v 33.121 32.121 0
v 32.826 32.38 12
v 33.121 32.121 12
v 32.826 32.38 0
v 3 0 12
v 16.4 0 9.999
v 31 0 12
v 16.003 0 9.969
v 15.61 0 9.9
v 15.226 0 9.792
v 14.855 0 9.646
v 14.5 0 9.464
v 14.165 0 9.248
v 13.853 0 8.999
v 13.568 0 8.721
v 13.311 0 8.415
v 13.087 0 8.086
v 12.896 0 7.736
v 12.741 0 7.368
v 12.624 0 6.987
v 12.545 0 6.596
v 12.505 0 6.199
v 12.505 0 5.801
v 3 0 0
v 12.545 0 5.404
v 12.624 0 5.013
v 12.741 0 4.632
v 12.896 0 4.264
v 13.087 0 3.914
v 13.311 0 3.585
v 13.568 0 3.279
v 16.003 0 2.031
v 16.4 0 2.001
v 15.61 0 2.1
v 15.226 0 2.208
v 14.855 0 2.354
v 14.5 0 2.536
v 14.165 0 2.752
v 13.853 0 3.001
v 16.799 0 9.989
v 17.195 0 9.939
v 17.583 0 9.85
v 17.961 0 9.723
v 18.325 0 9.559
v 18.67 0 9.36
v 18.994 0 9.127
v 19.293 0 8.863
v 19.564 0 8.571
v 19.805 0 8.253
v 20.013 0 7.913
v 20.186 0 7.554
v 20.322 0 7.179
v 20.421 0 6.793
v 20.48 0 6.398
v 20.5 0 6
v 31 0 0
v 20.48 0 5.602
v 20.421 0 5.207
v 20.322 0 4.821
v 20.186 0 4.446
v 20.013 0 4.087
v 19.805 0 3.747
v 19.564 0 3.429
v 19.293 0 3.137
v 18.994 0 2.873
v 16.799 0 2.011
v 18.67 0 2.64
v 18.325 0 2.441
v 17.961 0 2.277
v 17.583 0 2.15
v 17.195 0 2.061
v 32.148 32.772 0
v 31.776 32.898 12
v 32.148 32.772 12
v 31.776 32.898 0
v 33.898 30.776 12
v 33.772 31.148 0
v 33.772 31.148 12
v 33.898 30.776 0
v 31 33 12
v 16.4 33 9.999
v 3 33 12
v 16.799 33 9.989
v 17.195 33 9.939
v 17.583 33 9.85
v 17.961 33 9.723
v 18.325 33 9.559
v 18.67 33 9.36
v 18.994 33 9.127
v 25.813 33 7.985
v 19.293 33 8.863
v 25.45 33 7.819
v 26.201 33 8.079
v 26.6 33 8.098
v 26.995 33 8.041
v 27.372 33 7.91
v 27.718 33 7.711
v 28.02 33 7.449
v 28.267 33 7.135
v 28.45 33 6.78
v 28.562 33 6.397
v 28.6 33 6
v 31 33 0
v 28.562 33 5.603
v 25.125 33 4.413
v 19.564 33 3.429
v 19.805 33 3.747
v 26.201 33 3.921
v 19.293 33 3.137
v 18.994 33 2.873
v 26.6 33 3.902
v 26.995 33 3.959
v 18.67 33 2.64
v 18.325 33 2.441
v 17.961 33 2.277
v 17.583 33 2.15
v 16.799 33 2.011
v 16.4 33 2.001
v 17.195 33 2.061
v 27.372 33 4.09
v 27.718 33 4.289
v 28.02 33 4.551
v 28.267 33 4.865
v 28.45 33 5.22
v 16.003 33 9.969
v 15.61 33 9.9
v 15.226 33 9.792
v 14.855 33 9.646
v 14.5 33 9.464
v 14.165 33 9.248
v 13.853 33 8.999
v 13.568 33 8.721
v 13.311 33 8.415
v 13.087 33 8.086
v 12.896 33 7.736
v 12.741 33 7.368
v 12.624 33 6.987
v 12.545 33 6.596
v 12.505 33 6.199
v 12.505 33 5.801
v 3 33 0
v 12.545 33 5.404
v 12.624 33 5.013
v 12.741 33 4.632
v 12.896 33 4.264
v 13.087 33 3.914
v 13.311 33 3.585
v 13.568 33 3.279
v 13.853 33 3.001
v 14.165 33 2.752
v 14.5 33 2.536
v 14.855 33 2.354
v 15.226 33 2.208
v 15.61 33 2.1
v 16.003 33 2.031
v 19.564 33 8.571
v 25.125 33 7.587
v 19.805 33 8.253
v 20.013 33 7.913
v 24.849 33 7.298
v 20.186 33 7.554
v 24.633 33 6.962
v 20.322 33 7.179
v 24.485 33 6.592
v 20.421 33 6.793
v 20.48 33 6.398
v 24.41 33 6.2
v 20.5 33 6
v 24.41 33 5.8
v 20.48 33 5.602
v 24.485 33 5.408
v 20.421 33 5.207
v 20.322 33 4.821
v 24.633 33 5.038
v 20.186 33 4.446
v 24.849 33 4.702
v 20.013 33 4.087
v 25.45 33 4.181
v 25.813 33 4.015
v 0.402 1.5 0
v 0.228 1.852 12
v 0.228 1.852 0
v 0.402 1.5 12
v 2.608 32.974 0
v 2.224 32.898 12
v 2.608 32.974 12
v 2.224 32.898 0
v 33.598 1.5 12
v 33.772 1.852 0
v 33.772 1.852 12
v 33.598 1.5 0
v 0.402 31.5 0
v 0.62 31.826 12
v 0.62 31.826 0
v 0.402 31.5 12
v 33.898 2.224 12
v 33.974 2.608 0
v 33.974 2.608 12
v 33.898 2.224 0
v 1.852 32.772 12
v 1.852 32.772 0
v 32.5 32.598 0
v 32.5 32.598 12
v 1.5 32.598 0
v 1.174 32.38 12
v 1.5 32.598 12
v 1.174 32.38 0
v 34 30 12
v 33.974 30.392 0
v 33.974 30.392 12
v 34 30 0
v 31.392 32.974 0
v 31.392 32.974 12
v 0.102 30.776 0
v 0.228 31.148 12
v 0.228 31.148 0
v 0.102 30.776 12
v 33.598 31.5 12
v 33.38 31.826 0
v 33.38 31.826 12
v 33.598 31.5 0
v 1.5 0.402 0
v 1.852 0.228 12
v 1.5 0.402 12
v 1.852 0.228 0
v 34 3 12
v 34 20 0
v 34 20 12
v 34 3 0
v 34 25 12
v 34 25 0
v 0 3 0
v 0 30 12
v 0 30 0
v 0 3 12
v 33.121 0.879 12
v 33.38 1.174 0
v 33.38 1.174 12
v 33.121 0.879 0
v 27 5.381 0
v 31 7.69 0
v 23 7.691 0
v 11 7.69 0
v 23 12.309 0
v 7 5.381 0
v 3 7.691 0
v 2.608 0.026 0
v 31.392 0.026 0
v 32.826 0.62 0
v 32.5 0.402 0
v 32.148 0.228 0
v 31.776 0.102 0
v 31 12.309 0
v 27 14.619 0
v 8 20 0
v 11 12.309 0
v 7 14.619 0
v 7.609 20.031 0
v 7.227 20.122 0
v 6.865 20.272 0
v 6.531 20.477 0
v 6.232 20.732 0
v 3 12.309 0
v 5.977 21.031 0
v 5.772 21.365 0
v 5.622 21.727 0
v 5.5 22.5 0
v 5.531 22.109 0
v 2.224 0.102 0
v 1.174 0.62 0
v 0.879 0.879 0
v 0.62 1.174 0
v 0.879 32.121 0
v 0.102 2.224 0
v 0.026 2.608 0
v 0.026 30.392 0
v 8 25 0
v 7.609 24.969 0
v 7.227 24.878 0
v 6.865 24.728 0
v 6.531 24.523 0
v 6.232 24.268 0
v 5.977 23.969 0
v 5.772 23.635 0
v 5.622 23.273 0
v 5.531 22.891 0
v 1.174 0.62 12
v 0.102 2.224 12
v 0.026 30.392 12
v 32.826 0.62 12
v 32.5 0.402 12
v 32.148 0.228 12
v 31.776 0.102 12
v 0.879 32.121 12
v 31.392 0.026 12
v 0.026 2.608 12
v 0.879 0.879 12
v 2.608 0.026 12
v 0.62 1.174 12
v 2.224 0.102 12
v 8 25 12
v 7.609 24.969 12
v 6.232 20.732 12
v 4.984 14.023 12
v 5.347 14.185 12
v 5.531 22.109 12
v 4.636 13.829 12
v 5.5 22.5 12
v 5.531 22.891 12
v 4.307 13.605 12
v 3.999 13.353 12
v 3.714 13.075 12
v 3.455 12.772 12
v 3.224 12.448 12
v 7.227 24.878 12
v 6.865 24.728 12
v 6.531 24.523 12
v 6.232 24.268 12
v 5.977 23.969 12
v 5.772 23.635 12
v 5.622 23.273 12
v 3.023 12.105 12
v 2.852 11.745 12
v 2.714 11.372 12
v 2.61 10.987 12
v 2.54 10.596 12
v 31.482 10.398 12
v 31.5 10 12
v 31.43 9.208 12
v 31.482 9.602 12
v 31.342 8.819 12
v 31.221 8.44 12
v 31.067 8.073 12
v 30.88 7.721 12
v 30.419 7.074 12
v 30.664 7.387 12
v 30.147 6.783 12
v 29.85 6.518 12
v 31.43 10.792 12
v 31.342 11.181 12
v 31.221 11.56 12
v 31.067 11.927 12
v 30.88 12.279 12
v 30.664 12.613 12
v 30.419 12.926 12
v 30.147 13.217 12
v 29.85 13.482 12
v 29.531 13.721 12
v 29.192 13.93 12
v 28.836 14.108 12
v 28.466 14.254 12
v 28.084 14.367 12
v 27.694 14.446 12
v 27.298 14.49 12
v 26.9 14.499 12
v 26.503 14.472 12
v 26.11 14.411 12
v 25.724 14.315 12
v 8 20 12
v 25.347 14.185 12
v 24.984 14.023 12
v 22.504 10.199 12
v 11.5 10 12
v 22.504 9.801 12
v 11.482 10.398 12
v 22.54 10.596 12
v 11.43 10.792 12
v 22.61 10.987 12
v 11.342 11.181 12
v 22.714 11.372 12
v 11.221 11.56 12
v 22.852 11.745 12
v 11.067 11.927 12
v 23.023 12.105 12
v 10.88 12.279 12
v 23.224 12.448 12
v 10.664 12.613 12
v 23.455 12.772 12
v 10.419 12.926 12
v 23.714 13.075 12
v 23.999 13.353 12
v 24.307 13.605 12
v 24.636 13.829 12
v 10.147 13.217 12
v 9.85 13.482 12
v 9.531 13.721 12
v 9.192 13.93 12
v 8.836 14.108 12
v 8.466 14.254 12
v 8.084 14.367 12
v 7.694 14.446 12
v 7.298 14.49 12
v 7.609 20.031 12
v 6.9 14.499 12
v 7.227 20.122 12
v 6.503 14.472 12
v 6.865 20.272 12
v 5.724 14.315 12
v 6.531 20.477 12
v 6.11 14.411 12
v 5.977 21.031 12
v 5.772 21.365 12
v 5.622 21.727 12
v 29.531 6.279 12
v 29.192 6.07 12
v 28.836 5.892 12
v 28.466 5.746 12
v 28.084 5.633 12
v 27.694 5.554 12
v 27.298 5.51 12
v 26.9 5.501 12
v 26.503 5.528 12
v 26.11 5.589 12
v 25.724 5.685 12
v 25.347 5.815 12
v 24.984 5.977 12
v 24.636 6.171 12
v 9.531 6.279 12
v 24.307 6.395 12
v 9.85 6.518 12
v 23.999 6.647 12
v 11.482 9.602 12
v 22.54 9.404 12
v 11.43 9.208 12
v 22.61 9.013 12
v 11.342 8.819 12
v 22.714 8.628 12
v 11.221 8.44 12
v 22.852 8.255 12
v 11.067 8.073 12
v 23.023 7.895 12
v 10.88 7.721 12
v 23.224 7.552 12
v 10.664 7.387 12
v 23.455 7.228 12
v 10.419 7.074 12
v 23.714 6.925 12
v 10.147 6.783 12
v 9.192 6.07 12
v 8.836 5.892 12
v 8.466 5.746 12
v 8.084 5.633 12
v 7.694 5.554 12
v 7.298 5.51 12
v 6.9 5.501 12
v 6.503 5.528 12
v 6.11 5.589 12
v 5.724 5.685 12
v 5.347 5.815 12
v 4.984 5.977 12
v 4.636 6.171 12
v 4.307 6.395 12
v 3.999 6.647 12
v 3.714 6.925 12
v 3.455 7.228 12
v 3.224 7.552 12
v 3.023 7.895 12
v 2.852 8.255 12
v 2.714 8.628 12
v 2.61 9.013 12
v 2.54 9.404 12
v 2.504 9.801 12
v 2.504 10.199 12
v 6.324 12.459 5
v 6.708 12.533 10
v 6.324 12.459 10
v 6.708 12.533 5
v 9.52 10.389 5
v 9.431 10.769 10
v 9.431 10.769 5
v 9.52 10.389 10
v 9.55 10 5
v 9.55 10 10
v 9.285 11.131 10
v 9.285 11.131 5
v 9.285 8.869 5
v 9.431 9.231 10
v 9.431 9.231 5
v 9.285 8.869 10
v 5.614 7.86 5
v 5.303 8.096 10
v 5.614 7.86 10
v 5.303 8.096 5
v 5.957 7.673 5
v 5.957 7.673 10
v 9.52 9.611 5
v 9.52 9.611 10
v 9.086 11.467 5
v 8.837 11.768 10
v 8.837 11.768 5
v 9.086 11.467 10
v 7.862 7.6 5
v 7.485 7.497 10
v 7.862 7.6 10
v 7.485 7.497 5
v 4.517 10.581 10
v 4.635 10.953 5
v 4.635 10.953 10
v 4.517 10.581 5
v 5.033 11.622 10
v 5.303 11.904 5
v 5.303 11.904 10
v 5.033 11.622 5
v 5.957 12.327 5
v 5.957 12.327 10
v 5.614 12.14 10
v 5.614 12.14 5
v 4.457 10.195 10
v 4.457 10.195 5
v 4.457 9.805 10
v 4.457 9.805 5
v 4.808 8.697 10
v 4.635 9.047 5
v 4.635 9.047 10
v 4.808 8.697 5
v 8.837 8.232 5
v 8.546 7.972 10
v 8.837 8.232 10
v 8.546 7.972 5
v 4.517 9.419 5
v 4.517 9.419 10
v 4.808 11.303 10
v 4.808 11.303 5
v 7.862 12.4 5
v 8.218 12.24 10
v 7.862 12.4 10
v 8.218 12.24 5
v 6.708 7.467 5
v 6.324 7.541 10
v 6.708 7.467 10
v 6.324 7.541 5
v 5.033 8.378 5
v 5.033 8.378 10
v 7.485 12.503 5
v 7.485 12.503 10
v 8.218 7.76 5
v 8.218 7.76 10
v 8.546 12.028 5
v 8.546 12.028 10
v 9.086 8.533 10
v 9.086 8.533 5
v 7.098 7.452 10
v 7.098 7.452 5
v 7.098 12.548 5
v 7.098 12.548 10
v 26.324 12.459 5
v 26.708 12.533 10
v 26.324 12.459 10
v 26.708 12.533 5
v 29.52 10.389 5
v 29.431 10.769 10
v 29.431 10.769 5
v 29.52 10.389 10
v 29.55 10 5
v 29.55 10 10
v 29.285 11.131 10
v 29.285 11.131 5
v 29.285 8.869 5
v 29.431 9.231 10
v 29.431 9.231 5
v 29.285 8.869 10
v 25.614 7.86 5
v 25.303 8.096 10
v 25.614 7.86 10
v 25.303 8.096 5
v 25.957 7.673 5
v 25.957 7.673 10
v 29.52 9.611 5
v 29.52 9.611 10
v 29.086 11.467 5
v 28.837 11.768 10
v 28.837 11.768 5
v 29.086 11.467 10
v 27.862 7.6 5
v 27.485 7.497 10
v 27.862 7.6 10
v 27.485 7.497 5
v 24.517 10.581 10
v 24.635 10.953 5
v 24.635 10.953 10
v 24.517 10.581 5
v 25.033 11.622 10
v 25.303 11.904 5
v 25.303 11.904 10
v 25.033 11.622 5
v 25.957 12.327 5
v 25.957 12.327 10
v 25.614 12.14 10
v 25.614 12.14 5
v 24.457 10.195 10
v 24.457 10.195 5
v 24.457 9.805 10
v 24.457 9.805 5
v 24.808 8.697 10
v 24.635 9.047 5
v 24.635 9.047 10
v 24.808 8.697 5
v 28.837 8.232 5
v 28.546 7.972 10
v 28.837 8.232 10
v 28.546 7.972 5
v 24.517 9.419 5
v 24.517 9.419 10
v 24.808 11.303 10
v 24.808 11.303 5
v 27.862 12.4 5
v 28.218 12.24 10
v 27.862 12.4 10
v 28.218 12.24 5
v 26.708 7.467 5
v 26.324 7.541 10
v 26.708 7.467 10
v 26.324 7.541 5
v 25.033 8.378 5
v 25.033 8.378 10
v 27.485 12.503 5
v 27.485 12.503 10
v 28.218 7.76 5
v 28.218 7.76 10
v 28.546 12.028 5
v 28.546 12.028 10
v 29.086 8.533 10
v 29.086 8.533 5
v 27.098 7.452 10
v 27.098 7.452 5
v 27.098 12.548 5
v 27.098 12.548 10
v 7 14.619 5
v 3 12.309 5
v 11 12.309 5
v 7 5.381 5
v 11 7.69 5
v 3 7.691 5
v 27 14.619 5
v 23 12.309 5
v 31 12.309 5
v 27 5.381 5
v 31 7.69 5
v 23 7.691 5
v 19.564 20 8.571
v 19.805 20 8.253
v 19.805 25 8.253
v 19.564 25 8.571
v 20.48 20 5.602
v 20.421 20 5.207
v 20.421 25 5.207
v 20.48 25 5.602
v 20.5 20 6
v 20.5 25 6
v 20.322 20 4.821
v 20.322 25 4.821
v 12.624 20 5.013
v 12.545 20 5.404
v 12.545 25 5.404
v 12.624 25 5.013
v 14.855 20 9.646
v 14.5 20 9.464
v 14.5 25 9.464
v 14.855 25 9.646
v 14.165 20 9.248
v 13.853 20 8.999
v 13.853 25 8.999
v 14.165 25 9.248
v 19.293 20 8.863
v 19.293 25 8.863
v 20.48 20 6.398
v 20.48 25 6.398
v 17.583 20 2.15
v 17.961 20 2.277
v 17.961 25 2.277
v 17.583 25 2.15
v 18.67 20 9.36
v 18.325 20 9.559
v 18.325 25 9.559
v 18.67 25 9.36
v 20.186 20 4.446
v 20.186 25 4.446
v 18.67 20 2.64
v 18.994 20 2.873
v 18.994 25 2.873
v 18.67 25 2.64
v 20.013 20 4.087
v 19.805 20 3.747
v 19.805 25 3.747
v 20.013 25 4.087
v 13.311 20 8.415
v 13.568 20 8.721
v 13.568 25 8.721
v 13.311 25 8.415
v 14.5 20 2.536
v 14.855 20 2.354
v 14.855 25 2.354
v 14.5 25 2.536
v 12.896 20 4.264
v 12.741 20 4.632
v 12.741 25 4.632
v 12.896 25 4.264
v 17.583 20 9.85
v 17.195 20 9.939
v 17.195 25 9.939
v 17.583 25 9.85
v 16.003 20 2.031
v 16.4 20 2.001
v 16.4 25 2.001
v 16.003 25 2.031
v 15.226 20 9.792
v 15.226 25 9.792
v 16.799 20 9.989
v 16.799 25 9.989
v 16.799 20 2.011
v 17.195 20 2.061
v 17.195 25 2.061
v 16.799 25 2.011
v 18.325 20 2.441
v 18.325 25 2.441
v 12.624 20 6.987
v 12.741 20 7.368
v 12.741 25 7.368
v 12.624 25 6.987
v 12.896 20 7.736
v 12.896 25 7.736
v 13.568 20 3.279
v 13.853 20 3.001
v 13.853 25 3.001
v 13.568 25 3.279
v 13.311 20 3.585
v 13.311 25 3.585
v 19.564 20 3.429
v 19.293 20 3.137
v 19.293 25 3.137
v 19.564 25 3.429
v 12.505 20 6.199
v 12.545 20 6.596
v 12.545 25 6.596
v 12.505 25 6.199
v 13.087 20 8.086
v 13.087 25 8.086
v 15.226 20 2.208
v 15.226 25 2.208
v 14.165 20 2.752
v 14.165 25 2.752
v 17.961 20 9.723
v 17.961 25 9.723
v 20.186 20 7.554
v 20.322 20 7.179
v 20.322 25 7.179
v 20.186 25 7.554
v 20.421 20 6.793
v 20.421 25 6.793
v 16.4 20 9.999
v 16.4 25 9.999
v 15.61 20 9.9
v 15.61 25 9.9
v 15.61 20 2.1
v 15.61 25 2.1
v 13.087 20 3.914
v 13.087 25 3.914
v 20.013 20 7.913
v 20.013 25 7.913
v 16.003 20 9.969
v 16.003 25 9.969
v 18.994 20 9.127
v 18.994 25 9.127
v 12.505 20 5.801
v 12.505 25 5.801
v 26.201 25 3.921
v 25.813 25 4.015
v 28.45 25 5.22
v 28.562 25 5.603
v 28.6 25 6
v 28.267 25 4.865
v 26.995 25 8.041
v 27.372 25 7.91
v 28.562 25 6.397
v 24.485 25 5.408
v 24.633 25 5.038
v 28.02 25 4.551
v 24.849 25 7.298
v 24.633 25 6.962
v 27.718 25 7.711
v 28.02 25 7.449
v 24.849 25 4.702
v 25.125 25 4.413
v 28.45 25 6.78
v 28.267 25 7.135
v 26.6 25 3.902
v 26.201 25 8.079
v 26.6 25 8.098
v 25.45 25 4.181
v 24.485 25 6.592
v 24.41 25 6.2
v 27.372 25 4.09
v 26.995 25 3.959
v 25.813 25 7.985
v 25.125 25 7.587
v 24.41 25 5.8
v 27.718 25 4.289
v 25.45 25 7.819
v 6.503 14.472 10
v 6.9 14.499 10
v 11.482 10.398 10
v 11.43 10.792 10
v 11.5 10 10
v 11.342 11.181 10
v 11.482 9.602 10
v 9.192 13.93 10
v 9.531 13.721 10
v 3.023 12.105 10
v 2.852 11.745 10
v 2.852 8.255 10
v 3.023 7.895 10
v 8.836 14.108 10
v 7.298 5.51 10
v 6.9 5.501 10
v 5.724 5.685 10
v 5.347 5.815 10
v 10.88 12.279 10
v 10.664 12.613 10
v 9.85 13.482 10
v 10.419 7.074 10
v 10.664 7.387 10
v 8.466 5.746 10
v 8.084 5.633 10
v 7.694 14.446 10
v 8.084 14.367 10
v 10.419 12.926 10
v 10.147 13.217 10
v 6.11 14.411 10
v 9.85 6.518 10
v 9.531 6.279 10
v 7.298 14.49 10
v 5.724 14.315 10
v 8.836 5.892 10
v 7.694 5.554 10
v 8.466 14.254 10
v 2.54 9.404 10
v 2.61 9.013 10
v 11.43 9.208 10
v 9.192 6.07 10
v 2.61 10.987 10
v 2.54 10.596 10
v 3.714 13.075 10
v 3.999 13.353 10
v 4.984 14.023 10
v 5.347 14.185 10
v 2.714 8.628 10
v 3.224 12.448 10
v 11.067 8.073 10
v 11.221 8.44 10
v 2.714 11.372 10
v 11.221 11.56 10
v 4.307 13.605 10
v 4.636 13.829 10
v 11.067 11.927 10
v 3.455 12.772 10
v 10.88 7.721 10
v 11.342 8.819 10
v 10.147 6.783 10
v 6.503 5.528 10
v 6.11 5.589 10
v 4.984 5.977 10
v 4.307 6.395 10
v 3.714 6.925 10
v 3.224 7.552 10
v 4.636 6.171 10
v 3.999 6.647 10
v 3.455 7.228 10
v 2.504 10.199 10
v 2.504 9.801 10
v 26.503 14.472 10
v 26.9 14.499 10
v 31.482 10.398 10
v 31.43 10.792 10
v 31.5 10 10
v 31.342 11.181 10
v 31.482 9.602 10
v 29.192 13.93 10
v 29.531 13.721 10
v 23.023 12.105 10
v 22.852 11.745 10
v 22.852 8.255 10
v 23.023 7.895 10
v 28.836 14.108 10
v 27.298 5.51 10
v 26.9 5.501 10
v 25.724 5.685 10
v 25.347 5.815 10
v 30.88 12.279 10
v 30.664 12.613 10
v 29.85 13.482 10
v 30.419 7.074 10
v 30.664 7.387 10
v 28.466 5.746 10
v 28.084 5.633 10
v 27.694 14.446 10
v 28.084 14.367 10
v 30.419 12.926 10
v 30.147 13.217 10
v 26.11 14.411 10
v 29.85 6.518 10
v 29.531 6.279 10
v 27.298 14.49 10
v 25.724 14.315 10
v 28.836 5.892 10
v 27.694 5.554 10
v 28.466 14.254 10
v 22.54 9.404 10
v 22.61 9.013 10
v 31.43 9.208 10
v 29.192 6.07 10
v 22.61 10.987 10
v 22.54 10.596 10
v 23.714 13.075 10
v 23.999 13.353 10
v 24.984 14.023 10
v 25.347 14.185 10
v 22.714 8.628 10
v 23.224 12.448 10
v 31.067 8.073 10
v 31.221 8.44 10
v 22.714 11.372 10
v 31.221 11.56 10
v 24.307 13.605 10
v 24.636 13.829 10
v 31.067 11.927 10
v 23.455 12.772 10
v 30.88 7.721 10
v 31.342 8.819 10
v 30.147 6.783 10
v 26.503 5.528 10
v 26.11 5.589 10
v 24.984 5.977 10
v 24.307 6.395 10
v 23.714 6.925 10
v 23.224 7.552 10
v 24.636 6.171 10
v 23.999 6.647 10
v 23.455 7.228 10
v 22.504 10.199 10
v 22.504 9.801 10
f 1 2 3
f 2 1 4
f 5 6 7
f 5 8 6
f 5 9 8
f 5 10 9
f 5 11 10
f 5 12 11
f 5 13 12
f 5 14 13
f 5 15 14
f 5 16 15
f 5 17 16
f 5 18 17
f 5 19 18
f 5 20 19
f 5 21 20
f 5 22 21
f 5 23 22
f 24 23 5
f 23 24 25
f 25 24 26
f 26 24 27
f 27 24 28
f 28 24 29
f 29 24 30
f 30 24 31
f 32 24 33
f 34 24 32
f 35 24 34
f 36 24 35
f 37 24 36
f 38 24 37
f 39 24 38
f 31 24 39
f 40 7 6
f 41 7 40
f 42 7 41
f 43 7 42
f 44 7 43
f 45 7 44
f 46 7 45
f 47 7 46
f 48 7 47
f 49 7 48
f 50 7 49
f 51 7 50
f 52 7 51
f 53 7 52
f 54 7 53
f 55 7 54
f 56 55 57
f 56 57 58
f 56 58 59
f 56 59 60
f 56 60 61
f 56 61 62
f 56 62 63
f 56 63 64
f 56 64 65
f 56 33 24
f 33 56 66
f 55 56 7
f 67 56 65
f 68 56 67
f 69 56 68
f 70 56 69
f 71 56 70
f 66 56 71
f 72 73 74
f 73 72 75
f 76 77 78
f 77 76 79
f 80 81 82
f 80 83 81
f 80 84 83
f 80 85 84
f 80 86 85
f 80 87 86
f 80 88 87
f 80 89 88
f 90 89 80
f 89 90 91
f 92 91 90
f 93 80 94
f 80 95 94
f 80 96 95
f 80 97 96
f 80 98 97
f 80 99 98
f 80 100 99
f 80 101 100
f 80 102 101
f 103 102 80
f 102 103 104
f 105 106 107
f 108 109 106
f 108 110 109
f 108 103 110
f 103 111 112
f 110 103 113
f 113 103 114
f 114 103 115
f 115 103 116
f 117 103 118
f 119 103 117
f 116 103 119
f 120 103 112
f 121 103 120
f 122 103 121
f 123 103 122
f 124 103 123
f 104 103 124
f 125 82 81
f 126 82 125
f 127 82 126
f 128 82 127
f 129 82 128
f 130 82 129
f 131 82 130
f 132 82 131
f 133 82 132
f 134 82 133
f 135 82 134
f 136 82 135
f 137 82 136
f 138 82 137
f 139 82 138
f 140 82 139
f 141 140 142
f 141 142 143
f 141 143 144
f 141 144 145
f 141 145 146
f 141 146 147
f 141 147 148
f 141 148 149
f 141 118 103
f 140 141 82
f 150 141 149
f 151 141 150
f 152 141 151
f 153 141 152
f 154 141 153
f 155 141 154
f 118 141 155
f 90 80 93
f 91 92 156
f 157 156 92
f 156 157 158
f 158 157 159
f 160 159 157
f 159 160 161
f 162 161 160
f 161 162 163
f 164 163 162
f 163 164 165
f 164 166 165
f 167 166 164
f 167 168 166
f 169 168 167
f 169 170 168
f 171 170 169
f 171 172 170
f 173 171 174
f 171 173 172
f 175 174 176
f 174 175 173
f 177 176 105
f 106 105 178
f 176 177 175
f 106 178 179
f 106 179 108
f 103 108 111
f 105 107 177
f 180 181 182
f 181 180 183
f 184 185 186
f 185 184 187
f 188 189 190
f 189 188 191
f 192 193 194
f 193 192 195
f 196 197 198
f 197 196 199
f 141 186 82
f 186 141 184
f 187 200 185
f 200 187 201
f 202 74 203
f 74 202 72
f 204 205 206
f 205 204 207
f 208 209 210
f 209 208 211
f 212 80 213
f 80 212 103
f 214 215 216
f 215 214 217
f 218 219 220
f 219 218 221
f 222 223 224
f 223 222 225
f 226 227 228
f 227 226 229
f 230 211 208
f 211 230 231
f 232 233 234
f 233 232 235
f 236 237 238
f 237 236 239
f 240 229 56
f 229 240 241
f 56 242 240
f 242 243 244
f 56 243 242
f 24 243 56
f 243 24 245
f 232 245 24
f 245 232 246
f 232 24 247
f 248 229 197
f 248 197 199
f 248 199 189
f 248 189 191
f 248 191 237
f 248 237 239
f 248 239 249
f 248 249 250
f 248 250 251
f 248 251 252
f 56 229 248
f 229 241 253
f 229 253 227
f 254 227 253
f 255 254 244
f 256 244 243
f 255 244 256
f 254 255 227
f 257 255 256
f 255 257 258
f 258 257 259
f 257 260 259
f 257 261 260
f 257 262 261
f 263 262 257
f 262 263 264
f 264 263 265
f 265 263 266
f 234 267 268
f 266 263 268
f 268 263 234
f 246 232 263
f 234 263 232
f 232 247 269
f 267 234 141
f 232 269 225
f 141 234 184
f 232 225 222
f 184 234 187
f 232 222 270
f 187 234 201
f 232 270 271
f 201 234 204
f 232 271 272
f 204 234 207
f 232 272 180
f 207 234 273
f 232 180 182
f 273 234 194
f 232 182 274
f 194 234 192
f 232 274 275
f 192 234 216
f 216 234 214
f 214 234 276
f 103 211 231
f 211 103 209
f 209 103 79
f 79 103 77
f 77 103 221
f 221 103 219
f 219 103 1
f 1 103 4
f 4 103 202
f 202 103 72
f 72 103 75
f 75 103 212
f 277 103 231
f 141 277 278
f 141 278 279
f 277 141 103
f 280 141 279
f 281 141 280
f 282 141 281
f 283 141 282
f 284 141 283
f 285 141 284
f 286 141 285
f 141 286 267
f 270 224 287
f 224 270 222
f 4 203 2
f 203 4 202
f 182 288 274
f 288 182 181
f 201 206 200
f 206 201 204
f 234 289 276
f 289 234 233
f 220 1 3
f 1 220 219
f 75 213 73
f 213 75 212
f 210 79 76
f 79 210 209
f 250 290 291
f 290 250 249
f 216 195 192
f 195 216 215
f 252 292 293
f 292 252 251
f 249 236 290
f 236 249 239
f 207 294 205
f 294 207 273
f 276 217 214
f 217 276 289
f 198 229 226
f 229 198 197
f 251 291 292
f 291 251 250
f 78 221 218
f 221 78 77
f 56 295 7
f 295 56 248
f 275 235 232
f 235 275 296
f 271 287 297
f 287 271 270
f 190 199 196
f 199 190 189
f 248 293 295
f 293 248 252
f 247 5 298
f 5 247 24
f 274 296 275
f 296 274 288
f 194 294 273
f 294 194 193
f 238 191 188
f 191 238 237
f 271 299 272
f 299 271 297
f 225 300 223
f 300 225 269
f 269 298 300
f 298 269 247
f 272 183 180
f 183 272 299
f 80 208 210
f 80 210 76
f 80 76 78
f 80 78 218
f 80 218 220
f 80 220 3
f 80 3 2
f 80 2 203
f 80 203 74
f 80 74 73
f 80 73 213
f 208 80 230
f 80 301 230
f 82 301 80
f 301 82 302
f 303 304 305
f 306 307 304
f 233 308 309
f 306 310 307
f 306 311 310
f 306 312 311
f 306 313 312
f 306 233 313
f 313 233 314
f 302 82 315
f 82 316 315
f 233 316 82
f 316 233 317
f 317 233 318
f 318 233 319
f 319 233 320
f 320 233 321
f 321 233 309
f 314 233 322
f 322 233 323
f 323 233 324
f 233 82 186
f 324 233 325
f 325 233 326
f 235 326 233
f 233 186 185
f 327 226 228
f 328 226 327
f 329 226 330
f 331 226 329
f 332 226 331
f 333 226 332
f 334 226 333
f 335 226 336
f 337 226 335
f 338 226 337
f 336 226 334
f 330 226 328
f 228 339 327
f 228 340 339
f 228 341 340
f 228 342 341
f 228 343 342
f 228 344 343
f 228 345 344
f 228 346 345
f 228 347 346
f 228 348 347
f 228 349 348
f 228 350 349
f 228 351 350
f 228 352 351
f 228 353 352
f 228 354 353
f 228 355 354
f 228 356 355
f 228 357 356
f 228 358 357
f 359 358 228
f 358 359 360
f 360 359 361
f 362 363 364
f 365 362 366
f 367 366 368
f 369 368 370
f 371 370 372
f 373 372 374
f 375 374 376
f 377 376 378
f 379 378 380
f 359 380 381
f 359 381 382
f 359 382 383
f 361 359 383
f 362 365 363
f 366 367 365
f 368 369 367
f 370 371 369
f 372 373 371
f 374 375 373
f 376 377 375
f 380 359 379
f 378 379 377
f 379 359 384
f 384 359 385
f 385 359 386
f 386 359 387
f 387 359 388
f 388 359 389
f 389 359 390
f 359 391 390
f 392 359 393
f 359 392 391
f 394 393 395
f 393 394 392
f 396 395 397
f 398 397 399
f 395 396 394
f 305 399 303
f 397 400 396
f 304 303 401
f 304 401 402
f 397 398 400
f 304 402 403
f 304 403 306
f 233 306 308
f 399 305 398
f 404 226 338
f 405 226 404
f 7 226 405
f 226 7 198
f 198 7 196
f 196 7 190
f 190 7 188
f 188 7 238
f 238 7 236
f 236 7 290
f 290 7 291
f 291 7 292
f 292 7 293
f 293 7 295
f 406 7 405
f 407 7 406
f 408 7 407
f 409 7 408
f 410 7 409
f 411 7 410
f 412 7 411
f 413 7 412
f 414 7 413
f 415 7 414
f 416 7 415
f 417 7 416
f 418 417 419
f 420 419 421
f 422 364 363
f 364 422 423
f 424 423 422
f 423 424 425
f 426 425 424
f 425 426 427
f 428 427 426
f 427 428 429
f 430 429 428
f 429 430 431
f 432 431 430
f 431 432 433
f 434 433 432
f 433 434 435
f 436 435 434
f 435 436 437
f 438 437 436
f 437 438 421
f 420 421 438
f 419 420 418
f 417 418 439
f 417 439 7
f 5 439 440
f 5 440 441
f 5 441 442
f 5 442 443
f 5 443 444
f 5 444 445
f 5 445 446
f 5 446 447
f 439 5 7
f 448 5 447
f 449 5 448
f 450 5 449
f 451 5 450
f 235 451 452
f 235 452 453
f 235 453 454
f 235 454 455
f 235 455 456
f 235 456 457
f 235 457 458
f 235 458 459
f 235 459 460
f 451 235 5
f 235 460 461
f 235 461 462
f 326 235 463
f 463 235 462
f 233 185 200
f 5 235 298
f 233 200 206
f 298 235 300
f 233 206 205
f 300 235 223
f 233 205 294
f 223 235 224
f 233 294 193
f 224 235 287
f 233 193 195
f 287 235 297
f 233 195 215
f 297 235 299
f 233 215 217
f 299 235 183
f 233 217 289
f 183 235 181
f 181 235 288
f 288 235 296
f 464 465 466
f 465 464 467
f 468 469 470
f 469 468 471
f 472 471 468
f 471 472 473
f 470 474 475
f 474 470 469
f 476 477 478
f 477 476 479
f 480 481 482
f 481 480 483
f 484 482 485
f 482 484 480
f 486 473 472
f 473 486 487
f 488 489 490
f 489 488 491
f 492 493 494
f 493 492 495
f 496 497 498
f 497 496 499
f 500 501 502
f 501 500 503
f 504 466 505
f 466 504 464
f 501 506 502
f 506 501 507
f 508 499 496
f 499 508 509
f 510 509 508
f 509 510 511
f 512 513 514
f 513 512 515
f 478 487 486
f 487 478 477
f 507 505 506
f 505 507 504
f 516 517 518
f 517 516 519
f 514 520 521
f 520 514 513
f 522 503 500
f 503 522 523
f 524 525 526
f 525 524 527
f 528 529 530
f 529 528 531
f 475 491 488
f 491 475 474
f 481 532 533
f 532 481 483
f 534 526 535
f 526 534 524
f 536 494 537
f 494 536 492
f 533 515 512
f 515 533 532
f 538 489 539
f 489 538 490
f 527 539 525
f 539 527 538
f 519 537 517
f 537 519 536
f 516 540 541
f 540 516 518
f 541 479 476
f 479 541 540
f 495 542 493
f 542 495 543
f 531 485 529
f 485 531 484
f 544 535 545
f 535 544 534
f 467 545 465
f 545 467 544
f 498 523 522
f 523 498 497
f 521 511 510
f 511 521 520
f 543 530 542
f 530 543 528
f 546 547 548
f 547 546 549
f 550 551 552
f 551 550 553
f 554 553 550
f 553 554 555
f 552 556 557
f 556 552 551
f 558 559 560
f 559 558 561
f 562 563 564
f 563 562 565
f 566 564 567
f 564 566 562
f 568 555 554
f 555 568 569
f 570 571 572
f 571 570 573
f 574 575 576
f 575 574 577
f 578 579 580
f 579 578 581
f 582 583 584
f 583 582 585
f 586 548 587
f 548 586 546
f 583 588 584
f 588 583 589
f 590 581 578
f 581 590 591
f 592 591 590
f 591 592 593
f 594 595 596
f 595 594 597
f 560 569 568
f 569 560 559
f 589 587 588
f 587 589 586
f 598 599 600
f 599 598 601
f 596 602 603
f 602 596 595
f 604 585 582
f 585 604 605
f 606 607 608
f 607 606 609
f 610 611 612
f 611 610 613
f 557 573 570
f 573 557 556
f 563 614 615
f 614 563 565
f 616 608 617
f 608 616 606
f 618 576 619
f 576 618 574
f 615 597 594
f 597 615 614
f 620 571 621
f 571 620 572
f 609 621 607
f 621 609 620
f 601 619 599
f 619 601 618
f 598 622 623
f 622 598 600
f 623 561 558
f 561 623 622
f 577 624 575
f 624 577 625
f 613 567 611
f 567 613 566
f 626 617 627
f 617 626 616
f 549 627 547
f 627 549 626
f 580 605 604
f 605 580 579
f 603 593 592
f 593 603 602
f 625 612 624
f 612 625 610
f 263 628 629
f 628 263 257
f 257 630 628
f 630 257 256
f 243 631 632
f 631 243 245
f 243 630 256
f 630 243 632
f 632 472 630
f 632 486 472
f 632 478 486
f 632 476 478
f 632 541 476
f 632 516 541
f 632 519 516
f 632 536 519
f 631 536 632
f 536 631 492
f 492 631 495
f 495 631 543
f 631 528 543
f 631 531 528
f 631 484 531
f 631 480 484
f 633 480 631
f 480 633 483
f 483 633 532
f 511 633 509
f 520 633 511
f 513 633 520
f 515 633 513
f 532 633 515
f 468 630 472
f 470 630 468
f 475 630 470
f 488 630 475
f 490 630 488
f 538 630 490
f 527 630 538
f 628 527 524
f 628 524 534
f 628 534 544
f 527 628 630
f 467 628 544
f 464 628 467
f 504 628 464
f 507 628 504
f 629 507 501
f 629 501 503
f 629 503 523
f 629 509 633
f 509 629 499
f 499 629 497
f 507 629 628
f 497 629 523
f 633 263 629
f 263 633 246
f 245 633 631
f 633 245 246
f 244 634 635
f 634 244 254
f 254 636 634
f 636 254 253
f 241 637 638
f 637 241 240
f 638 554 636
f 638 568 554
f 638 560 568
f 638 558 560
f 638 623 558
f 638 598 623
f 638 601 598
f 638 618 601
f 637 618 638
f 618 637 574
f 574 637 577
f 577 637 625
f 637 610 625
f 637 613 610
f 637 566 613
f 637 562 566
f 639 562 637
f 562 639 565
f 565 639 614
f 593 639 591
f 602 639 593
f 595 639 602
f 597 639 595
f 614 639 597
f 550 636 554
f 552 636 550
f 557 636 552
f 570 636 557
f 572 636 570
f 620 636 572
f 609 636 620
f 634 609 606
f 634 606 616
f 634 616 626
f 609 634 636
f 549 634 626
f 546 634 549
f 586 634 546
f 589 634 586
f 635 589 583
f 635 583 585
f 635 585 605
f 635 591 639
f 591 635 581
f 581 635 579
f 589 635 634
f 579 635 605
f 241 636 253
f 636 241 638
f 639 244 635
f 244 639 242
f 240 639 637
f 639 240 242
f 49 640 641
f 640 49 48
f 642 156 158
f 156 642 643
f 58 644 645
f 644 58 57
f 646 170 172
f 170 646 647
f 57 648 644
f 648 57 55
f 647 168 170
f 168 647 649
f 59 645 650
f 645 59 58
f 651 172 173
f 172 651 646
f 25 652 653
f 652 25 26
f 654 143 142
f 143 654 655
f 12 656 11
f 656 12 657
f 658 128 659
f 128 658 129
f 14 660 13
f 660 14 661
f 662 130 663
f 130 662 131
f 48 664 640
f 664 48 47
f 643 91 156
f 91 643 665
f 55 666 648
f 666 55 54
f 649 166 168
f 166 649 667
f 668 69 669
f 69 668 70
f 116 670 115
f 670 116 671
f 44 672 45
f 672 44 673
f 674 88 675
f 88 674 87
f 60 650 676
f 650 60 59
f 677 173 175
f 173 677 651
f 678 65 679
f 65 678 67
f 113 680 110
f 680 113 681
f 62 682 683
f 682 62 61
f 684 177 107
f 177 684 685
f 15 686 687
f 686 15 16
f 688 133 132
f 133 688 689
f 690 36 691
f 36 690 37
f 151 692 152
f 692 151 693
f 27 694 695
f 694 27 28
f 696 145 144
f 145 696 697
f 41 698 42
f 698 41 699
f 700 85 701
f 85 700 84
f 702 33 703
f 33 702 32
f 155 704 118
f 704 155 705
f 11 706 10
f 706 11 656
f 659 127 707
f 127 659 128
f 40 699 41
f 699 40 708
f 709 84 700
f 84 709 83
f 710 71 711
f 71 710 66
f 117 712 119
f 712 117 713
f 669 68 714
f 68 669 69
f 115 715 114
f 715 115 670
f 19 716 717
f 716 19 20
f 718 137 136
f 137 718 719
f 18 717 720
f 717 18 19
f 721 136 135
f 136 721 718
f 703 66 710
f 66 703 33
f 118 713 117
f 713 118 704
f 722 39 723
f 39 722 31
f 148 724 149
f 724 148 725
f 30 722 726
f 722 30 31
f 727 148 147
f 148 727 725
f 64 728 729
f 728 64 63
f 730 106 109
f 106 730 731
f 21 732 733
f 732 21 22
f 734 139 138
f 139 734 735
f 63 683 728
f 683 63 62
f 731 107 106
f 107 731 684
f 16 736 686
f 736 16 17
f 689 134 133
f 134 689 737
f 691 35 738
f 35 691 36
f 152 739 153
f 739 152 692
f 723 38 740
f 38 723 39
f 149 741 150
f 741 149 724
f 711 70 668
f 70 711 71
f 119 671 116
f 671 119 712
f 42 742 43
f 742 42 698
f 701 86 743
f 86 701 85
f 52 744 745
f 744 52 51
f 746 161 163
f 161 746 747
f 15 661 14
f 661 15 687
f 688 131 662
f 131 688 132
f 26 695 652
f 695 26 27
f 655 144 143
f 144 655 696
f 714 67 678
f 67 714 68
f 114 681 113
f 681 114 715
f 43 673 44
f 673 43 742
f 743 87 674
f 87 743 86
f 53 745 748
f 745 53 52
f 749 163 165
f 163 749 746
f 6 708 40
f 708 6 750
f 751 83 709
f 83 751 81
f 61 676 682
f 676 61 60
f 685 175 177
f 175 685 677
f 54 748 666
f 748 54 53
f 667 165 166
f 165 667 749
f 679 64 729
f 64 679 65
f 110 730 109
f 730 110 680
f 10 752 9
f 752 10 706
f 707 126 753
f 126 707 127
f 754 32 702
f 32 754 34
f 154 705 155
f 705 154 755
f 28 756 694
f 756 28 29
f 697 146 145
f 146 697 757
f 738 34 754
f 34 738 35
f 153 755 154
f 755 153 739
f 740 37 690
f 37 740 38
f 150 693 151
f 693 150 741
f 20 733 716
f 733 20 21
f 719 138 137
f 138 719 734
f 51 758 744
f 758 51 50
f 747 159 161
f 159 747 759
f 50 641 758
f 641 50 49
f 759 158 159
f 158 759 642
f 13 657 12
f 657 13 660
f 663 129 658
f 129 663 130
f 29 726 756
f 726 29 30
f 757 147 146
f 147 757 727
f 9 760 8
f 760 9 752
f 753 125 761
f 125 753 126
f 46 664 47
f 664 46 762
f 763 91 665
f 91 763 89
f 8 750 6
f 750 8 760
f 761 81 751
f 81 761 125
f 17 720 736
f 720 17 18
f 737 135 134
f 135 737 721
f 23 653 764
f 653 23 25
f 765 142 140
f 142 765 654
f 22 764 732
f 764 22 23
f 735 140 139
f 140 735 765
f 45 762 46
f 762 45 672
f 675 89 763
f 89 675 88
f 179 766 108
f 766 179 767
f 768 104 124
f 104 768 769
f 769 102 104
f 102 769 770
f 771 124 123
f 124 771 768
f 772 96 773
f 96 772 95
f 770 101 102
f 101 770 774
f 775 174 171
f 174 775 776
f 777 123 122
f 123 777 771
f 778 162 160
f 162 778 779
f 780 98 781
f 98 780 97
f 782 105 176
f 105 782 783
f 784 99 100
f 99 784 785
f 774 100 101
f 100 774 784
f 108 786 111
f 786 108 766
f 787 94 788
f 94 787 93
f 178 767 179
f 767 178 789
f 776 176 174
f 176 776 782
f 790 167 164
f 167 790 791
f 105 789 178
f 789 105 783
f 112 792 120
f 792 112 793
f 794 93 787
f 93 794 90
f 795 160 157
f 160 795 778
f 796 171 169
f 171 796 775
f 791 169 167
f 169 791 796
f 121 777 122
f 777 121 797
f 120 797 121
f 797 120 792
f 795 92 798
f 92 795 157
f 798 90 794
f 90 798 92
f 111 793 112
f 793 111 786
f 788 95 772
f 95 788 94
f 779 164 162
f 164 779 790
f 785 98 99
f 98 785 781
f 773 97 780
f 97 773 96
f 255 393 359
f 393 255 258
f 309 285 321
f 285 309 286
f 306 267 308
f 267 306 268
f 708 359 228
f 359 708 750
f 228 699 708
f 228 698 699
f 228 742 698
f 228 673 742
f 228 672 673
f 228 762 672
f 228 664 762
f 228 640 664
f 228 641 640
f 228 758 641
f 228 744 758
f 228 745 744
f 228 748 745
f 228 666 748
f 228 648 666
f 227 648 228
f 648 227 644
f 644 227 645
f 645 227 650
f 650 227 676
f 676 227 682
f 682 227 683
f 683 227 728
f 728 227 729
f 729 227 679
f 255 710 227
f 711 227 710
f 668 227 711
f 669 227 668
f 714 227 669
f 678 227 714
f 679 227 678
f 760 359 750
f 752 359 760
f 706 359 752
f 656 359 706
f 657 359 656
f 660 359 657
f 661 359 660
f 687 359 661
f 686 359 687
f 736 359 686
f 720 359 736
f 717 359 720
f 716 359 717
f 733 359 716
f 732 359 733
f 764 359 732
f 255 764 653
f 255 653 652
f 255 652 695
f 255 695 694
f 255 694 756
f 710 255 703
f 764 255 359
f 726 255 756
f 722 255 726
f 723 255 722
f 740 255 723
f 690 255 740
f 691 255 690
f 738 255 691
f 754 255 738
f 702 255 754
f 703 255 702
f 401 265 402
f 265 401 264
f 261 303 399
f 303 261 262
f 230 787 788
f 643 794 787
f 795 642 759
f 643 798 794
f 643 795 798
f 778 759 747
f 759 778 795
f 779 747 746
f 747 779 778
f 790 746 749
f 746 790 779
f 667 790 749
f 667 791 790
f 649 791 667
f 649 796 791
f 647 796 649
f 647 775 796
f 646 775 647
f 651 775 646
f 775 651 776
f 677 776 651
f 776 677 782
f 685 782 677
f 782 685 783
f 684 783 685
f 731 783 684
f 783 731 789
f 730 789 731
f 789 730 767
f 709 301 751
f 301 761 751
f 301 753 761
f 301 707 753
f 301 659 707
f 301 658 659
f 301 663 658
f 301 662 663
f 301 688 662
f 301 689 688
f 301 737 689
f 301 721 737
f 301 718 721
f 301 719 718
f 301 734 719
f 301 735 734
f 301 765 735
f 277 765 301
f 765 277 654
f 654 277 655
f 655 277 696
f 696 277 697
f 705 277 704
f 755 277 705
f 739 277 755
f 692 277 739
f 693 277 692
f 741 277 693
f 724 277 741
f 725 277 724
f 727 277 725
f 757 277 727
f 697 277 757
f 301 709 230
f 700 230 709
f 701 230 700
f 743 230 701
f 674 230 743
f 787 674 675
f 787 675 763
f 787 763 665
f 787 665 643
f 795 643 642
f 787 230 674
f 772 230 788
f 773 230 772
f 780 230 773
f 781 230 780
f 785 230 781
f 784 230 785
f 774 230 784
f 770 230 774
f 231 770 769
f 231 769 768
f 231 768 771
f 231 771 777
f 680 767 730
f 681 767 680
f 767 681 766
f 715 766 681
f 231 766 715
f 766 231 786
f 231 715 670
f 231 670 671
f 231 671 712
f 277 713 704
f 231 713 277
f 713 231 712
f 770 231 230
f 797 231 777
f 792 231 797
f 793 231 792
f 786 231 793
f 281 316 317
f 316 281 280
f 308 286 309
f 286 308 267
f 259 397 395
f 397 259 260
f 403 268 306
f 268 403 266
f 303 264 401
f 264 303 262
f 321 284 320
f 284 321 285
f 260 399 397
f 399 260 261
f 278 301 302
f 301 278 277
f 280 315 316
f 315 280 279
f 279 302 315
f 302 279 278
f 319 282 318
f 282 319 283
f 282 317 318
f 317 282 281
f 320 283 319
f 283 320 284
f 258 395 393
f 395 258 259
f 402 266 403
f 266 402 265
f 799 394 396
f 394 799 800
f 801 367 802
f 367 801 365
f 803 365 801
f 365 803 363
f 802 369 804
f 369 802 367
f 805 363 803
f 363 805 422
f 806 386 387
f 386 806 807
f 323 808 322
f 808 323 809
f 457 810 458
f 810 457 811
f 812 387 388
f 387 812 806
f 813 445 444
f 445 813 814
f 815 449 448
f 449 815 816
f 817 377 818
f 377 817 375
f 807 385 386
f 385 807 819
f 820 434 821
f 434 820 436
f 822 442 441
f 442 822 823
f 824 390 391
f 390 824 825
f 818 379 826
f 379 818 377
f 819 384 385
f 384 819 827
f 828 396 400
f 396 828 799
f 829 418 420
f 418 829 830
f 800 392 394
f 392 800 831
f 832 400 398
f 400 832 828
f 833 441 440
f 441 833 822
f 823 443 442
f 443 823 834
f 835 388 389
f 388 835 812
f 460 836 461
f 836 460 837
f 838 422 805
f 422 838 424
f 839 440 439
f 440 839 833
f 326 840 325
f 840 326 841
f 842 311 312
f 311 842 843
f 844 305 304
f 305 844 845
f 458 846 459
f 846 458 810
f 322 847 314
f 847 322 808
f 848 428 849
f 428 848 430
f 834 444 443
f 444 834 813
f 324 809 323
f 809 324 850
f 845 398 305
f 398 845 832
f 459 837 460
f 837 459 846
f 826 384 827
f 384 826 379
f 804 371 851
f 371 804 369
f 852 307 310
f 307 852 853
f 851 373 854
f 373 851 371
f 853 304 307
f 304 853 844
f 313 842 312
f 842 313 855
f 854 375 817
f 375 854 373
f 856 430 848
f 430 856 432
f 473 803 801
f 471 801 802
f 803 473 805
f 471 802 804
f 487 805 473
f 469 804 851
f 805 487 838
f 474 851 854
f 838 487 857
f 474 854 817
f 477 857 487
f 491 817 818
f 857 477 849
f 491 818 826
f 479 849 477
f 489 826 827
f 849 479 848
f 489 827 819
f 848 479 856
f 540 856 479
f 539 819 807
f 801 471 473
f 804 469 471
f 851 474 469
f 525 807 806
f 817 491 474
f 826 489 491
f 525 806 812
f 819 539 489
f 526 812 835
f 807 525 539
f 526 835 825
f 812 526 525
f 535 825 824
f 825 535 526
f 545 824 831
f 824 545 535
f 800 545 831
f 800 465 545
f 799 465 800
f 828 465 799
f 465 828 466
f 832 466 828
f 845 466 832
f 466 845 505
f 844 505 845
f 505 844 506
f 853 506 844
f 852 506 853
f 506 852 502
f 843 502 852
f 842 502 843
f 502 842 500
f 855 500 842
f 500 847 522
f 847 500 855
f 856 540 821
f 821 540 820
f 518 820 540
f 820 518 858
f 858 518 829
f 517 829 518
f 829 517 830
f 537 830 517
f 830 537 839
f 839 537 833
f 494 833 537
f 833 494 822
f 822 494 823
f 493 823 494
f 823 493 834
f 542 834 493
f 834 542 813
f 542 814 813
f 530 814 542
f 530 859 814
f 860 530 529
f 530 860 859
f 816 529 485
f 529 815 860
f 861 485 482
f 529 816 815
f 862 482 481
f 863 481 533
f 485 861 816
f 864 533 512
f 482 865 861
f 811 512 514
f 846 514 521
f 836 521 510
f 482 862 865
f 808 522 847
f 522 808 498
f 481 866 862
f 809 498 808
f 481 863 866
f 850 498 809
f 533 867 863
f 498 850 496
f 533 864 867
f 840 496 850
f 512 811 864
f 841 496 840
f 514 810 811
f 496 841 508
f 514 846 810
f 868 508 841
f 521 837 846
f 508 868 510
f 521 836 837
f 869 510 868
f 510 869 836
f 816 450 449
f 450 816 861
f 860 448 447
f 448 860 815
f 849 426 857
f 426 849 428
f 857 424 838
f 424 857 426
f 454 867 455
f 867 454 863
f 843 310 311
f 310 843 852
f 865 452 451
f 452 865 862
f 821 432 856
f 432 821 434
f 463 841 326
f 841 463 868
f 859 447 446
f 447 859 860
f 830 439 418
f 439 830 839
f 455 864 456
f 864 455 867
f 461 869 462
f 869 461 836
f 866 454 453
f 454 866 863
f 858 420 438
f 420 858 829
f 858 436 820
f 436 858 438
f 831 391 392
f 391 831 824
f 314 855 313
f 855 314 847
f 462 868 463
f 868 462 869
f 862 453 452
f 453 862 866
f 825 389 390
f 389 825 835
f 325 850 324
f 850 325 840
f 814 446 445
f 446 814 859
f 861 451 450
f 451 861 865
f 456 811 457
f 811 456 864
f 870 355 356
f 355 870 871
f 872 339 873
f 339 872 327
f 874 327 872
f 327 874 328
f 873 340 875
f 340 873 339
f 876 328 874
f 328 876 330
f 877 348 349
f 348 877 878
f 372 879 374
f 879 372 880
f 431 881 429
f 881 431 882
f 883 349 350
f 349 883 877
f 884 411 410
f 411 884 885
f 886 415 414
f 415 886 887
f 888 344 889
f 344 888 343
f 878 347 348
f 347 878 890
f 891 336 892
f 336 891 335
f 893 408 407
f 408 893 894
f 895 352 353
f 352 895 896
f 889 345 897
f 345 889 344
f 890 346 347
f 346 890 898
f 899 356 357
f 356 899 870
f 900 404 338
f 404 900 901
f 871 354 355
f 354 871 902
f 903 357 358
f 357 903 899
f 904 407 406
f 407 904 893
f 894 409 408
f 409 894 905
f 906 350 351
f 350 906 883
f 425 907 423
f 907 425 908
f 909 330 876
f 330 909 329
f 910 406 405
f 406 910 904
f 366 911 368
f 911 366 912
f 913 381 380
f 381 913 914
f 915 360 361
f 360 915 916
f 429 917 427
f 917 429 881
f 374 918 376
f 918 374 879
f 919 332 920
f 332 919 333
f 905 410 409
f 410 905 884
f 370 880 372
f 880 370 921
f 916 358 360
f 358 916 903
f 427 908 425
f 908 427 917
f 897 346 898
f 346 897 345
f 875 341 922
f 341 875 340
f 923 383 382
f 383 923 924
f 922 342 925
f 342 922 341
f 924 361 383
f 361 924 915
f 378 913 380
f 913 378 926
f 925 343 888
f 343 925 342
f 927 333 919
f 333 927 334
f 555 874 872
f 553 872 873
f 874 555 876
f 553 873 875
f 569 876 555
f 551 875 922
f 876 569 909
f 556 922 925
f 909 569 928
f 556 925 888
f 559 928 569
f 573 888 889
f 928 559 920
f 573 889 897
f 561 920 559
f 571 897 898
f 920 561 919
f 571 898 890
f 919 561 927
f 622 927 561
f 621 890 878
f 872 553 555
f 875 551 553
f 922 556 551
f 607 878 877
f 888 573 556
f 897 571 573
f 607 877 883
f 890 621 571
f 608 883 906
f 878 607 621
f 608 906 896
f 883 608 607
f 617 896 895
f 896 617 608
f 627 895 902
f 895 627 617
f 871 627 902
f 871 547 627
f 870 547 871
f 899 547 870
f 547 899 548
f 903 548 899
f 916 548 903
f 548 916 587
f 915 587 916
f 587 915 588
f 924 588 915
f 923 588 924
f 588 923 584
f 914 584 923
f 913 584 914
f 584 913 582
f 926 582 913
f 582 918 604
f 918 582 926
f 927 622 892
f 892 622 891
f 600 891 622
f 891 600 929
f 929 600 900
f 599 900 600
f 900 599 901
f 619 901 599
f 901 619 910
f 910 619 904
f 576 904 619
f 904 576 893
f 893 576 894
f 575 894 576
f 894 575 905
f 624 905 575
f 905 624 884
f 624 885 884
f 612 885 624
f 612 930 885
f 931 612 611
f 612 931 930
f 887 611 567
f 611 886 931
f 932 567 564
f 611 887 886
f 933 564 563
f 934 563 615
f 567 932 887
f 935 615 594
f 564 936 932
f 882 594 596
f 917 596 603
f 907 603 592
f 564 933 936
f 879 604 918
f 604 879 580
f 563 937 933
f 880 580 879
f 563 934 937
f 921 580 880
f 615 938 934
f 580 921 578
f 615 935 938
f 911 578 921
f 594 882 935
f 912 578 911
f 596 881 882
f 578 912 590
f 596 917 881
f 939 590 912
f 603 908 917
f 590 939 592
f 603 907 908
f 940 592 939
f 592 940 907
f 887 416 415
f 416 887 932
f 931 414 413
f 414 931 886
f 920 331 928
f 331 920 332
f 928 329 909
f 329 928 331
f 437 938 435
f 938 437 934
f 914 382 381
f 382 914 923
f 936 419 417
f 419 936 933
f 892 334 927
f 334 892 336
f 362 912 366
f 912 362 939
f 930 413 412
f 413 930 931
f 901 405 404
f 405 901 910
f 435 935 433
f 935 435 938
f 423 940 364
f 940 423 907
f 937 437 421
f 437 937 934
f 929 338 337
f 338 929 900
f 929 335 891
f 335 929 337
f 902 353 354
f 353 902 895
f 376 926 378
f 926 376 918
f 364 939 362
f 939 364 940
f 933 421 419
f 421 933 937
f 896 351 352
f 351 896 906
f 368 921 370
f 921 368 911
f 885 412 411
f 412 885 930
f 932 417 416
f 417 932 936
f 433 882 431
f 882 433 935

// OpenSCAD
$fa = 1.0;
$fs = 0.4;

module regular_polygon(order = 4, r=1){
    angles=[ for (i = [0:order-1]) i*(360/order) ];
    coords=[ for (th=angles) [r*cos(th), r*sin(th)] ];
    polygon(coords);
}

color("slategray"){
    difference(){
        hull(){
            translate([3,3,0]) cylinder(r=3,h=12);
            translate([31,3,0]) cylinder(r=3,h=12);
            translate([3,30,0]) cylinder(r=3,h=12);
            translate([31,30,0]) cylinder(r=3,h=12);}
        translate([7,10,-1]) cylinder(r=2.55,h=14);
        translate([27,10,-1]) cylinder(r=2.55,h=14);
        translate([7,10,-1]) rotate([0,0,30]) linear_extrude(6){regular_polygon(order=6,r=4.619);}
        translate([27,10,-1]) rotate([0,0,30]) linear_extrude(6){regular_polygon(order=6,r=4.619);}
        translate([16.5,-1,6]) rotate([270,0,0]) cylinder(r=4,h=35);
        translate([26.5,24,6]) rotate([270,0,0]) cylinder(r=2.1,h=10);
        hull(){
            translate([8,22.5,-1]) cylinder(r=2.5,h=14);
            translate([30,20,-1]) cube([5,5,14]);}
        translate([7,10,10]) cylinder(r=4.5,h=3);
        translate([27,10,10]) cylinder(r=4.5,h=3);}}
